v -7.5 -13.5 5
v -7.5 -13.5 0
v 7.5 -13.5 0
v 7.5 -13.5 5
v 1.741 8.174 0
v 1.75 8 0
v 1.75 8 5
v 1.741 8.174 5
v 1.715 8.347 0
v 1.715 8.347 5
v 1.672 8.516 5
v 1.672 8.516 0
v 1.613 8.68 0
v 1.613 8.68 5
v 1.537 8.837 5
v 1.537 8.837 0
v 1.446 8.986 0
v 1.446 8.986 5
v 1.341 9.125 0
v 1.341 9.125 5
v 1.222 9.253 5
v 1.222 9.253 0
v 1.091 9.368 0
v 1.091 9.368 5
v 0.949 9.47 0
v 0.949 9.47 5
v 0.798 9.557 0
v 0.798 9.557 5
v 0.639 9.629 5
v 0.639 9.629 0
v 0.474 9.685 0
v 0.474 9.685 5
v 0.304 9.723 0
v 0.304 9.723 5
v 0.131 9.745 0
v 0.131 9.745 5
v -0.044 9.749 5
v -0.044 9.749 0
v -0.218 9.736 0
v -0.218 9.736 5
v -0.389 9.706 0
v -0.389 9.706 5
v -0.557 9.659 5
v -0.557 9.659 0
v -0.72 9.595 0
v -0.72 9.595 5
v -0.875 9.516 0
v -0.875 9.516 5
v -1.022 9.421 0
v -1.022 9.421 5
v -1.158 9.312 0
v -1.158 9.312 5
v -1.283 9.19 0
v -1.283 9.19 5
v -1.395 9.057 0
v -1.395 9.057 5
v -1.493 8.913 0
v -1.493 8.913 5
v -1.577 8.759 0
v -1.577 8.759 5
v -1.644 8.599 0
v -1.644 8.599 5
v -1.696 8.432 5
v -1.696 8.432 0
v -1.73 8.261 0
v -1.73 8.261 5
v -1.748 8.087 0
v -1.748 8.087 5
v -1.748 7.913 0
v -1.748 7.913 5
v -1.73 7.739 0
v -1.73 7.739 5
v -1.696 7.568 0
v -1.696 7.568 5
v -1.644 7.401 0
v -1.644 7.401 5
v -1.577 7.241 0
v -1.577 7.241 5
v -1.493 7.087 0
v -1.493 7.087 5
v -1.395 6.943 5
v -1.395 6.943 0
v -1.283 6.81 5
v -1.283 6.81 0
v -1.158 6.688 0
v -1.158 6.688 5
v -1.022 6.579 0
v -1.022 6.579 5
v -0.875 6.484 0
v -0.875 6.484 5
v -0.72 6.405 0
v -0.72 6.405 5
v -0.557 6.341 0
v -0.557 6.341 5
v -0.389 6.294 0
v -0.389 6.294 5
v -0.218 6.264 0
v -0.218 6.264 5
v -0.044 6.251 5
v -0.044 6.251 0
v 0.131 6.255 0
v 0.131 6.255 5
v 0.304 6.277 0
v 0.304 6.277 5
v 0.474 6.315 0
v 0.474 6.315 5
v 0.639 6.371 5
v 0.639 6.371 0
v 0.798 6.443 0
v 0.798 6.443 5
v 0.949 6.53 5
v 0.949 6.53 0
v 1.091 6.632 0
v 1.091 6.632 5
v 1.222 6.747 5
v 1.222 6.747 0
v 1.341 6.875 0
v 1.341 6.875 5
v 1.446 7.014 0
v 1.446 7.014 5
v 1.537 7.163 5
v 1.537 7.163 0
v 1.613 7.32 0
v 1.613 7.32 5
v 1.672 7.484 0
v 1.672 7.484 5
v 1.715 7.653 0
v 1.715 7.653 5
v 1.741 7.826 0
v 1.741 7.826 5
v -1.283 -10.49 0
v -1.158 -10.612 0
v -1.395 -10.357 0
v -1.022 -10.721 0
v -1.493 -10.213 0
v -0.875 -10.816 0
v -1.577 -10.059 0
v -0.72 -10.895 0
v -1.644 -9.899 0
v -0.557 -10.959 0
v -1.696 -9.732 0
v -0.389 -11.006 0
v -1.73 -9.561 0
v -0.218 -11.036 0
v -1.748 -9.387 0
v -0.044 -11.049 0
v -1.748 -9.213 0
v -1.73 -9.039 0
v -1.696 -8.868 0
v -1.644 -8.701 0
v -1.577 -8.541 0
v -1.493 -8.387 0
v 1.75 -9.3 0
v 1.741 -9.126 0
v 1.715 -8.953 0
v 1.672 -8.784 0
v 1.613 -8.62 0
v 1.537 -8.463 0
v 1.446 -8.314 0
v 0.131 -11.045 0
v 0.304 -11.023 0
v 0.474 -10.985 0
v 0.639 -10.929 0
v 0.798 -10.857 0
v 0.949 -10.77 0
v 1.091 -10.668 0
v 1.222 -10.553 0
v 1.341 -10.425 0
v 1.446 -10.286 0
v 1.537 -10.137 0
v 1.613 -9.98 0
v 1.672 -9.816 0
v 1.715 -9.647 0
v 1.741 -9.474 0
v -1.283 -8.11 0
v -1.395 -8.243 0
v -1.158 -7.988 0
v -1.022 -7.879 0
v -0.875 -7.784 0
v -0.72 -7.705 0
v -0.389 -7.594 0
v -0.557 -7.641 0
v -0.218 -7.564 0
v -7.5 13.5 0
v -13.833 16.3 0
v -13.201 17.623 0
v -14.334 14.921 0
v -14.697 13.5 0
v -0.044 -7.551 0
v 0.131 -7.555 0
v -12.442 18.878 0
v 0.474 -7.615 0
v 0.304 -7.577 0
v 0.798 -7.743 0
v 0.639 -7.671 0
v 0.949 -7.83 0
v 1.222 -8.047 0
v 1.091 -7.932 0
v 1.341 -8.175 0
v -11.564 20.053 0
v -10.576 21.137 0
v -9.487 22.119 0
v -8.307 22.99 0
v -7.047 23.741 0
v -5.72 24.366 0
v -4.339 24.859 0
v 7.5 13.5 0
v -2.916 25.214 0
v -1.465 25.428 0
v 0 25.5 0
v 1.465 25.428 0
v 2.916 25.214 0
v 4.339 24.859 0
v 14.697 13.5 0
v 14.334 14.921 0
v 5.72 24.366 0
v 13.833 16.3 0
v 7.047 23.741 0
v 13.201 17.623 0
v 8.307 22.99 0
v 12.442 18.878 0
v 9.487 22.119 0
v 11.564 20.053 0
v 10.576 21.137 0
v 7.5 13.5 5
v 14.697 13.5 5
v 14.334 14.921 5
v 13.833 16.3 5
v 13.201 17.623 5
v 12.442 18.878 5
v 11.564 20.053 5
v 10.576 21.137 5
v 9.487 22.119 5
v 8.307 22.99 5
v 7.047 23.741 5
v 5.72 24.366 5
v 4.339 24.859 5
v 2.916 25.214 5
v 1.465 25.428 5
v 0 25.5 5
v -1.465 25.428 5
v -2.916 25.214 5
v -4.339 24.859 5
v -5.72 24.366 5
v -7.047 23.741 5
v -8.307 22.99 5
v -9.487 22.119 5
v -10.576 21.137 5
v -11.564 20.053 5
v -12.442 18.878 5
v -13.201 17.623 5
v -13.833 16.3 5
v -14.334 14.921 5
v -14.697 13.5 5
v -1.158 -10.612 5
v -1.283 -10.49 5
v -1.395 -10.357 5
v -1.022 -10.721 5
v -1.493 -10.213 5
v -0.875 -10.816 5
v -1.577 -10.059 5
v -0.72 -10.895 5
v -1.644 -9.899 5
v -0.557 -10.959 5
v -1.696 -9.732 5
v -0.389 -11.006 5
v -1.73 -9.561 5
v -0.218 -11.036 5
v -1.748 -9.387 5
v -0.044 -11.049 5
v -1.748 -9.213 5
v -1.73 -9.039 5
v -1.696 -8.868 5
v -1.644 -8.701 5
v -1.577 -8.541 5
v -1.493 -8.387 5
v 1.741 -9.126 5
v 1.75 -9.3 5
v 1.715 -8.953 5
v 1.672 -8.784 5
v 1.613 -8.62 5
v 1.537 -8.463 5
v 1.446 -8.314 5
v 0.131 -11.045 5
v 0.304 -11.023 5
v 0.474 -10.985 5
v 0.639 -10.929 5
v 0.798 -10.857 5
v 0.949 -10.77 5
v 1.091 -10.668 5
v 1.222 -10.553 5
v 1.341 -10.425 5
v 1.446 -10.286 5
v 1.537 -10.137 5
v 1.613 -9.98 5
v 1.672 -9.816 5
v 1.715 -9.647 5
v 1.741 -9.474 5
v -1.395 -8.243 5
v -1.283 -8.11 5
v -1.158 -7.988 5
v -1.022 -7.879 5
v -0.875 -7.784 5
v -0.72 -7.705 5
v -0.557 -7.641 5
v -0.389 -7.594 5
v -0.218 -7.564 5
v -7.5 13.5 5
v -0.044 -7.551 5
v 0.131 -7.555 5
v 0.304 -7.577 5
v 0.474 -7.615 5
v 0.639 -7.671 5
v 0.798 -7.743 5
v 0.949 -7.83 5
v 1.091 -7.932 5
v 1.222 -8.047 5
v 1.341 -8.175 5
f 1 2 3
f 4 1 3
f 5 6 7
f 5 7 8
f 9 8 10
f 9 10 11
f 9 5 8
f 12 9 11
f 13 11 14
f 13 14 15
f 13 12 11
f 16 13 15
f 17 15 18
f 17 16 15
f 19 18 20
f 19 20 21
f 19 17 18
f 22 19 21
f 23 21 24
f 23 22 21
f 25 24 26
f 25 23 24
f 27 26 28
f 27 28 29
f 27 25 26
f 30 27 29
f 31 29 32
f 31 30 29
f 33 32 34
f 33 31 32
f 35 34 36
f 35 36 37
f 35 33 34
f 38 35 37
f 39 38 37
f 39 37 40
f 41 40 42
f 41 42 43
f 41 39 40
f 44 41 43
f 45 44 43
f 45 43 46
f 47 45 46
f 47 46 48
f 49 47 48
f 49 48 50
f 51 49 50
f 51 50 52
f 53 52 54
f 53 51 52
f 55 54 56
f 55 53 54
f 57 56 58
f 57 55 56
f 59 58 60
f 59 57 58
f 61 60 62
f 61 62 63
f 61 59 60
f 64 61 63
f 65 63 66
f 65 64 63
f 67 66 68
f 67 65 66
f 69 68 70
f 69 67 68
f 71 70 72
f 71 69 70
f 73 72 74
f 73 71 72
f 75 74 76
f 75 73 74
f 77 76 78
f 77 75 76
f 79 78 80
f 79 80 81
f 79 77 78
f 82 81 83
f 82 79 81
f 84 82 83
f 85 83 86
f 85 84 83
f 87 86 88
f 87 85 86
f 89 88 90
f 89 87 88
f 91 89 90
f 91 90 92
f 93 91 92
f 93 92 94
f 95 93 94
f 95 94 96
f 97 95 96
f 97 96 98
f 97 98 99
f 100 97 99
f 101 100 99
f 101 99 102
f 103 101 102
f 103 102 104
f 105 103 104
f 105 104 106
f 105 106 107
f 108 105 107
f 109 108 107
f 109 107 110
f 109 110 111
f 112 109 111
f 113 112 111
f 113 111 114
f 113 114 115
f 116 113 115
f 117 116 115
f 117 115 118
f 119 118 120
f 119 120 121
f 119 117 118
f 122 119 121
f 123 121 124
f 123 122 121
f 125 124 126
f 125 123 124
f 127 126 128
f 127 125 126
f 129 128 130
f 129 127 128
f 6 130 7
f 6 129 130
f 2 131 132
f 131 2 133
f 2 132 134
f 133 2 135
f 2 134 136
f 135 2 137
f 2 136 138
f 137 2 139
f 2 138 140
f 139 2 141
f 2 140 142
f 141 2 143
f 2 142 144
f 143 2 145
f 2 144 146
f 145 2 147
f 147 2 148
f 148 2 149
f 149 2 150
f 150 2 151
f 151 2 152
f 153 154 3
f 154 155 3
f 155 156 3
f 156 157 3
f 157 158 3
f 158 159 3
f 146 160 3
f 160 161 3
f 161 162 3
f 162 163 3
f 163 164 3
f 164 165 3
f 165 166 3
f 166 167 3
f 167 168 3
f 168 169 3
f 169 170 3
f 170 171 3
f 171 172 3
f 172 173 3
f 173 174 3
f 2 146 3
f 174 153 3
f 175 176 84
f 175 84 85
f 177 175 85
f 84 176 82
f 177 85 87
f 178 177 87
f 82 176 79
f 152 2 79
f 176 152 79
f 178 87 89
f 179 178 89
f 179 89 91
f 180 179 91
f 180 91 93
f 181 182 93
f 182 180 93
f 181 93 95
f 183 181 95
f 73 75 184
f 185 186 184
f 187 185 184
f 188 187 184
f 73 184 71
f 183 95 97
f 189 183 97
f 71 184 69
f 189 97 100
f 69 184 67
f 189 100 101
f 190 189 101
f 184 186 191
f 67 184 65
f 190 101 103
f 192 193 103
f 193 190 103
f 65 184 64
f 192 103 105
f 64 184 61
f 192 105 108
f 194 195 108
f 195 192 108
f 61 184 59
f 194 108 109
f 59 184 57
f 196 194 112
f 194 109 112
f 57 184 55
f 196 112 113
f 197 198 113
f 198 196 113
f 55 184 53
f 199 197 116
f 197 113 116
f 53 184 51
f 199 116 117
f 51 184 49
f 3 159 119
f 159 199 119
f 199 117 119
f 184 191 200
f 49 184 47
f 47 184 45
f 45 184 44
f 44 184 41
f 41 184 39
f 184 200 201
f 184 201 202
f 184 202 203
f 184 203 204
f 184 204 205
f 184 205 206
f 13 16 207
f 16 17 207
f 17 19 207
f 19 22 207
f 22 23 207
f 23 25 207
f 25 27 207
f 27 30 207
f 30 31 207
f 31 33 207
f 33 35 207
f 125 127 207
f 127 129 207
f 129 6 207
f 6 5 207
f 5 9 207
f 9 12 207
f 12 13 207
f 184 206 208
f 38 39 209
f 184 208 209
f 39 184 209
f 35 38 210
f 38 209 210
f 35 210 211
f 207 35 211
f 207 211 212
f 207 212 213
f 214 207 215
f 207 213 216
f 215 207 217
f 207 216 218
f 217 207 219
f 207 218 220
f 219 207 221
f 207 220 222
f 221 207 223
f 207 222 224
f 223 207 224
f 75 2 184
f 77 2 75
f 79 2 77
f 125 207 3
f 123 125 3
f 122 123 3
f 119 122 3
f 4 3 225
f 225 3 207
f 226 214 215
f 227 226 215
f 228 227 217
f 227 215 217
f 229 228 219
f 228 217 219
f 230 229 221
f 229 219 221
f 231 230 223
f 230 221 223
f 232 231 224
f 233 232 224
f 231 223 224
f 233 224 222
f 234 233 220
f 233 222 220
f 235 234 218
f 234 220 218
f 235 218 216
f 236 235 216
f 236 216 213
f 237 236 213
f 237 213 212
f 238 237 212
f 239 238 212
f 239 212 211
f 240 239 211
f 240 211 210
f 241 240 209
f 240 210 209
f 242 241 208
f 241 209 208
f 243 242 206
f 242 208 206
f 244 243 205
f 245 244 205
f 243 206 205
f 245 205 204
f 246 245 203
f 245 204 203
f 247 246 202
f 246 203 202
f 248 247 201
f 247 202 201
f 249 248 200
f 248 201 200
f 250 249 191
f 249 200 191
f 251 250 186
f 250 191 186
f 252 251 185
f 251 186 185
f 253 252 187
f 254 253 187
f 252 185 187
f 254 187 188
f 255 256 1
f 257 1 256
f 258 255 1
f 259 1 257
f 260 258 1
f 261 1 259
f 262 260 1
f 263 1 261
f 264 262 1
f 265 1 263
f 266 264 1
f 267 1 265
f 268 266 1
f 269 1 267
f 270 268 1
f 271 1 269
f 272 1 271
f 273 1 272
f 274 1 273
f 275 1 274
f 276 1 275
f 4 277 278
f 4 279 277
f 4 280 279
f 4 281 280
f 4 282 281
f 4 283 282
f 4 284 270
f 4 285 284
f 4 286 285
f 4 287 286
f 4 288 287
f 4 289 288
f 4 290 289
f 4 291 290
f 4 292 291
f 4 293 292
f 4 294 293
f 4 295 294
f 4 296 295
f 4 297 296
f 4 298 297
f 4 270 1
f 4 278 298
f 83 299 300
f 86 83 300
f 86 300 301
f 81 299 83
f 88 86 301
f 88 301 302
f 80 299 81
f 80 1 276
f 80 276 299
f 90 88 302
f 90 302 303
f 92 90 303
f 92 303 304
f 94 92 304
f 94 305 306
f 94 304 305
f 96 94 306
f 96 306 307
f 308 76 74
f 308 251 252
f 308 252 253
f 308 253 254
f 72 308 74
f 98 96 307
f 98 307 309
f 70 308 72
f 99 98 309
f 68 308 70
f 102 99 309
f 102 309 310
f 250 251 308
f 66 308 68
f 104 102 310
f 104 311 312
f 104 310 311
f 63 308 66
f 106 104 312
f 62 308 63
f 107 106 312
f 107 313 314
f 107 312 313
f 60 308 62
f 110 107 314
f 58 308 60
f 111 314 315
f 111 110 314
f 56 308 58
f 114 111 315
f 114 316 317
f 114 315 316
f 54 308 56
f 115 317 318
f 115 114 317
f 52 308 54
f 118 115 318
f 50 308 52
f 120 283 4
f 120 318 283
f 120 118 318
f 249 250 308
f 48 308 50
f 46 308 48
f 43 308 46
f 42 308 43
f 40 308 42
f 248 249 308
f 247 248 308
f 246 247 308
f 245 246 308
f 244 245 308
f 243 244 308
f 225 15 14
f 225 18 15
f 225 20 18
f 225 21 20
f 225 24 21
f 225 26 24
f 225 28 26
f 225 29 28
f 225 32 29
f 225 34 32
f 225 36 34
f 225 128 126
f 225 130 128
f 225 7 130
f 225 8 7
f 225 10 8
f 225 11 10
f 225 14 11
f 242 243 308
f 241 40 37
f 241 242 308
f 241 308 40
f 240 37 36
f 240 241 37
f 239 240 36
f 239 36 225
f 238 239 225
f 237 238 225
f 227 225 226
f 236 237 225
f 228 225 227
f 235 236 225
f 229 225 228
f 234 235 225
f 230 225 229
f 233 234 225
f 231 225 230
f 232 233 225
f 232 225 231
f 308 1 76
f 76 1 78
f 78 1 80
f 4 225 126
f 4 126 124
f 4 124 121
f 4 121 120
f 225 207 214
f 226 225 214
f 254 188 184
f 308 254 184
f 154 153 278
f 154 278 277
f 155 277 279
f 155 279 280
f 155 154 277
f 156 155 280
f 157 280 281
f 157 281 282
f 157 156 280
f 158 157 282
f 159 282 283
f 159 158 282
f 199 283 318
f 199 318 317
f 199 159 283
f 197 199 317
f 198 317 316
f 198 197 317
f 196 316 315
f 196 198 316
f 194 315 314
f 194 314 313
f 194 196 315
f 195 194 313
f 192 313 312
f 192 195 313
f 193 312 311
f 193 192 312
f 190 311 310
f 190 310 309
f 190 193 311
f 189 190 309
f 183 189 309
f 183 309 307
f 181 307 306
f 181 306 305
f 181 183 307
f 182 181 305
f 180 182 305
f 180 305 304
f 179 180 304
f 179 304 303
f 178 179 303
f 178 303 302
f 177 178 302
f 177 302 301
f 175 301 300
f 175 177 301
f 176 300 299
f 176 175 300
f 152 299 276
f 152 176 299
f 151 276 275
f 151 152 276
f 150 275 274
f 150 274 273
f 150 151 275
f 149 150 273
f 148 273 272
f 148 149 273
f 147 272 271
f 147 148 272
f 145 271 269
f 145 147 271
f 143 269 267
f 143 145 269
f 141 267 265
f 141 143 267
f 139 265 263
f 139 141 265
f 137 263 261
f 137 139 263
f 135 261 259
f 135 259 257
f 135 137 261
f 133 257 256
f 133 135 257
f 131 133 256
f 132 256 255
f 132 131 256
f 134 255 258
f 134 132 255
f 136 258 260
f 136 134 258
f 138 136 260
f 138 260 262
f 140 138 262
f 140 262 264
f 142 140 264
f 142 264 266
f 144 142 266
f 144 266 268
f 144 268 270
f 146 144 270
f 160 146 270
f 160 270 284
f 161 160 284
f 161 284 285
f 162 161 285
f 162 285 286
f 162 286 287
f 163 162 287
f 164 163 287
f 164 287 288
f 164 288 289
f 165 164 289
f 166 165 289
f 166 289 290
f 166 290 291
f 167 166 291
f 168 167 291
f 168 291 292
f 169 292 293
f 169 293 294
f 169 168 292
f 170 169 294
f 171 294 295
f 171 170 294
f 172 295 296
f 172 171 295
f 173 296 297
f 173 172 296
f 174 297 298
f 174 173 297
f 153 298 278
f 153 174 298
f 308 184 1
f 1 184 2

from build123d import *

# Parameters (mm, degrees)
F0_R     = 1.75
F1_DEPTH = 5


with BuildPart() as f1:
    # F0 (on Top) → F1 (new body)
    with BuildSketch(Plane.XY):
        with BuildLine():
            Line((-7.5, 13.5), (-7.5, -13.5))
            Line((-7.5, -13.5), (7.5, -13.5))
            Line((7.5, -13.5), (7.5, 13.5))
            Line((7.5, 13.5), (14.696938, 13.5))
            ThreePointArc((14.696938, 13.5), (0, 25.5), (-14.696938, 13.5))
            Line((-14.696938, 13.5), (-7.5, 13.5))
        make_face()
        with Locations((0, -9.3)):
            Circle(F0_R, mode=Mode.SUBTRACT)
        with Locations((0, 8)):
            Circle(F0_R, mode=Mode.SUBTRACT)
    extrude(amount=F1_DEPTH)


solid = f1.part
